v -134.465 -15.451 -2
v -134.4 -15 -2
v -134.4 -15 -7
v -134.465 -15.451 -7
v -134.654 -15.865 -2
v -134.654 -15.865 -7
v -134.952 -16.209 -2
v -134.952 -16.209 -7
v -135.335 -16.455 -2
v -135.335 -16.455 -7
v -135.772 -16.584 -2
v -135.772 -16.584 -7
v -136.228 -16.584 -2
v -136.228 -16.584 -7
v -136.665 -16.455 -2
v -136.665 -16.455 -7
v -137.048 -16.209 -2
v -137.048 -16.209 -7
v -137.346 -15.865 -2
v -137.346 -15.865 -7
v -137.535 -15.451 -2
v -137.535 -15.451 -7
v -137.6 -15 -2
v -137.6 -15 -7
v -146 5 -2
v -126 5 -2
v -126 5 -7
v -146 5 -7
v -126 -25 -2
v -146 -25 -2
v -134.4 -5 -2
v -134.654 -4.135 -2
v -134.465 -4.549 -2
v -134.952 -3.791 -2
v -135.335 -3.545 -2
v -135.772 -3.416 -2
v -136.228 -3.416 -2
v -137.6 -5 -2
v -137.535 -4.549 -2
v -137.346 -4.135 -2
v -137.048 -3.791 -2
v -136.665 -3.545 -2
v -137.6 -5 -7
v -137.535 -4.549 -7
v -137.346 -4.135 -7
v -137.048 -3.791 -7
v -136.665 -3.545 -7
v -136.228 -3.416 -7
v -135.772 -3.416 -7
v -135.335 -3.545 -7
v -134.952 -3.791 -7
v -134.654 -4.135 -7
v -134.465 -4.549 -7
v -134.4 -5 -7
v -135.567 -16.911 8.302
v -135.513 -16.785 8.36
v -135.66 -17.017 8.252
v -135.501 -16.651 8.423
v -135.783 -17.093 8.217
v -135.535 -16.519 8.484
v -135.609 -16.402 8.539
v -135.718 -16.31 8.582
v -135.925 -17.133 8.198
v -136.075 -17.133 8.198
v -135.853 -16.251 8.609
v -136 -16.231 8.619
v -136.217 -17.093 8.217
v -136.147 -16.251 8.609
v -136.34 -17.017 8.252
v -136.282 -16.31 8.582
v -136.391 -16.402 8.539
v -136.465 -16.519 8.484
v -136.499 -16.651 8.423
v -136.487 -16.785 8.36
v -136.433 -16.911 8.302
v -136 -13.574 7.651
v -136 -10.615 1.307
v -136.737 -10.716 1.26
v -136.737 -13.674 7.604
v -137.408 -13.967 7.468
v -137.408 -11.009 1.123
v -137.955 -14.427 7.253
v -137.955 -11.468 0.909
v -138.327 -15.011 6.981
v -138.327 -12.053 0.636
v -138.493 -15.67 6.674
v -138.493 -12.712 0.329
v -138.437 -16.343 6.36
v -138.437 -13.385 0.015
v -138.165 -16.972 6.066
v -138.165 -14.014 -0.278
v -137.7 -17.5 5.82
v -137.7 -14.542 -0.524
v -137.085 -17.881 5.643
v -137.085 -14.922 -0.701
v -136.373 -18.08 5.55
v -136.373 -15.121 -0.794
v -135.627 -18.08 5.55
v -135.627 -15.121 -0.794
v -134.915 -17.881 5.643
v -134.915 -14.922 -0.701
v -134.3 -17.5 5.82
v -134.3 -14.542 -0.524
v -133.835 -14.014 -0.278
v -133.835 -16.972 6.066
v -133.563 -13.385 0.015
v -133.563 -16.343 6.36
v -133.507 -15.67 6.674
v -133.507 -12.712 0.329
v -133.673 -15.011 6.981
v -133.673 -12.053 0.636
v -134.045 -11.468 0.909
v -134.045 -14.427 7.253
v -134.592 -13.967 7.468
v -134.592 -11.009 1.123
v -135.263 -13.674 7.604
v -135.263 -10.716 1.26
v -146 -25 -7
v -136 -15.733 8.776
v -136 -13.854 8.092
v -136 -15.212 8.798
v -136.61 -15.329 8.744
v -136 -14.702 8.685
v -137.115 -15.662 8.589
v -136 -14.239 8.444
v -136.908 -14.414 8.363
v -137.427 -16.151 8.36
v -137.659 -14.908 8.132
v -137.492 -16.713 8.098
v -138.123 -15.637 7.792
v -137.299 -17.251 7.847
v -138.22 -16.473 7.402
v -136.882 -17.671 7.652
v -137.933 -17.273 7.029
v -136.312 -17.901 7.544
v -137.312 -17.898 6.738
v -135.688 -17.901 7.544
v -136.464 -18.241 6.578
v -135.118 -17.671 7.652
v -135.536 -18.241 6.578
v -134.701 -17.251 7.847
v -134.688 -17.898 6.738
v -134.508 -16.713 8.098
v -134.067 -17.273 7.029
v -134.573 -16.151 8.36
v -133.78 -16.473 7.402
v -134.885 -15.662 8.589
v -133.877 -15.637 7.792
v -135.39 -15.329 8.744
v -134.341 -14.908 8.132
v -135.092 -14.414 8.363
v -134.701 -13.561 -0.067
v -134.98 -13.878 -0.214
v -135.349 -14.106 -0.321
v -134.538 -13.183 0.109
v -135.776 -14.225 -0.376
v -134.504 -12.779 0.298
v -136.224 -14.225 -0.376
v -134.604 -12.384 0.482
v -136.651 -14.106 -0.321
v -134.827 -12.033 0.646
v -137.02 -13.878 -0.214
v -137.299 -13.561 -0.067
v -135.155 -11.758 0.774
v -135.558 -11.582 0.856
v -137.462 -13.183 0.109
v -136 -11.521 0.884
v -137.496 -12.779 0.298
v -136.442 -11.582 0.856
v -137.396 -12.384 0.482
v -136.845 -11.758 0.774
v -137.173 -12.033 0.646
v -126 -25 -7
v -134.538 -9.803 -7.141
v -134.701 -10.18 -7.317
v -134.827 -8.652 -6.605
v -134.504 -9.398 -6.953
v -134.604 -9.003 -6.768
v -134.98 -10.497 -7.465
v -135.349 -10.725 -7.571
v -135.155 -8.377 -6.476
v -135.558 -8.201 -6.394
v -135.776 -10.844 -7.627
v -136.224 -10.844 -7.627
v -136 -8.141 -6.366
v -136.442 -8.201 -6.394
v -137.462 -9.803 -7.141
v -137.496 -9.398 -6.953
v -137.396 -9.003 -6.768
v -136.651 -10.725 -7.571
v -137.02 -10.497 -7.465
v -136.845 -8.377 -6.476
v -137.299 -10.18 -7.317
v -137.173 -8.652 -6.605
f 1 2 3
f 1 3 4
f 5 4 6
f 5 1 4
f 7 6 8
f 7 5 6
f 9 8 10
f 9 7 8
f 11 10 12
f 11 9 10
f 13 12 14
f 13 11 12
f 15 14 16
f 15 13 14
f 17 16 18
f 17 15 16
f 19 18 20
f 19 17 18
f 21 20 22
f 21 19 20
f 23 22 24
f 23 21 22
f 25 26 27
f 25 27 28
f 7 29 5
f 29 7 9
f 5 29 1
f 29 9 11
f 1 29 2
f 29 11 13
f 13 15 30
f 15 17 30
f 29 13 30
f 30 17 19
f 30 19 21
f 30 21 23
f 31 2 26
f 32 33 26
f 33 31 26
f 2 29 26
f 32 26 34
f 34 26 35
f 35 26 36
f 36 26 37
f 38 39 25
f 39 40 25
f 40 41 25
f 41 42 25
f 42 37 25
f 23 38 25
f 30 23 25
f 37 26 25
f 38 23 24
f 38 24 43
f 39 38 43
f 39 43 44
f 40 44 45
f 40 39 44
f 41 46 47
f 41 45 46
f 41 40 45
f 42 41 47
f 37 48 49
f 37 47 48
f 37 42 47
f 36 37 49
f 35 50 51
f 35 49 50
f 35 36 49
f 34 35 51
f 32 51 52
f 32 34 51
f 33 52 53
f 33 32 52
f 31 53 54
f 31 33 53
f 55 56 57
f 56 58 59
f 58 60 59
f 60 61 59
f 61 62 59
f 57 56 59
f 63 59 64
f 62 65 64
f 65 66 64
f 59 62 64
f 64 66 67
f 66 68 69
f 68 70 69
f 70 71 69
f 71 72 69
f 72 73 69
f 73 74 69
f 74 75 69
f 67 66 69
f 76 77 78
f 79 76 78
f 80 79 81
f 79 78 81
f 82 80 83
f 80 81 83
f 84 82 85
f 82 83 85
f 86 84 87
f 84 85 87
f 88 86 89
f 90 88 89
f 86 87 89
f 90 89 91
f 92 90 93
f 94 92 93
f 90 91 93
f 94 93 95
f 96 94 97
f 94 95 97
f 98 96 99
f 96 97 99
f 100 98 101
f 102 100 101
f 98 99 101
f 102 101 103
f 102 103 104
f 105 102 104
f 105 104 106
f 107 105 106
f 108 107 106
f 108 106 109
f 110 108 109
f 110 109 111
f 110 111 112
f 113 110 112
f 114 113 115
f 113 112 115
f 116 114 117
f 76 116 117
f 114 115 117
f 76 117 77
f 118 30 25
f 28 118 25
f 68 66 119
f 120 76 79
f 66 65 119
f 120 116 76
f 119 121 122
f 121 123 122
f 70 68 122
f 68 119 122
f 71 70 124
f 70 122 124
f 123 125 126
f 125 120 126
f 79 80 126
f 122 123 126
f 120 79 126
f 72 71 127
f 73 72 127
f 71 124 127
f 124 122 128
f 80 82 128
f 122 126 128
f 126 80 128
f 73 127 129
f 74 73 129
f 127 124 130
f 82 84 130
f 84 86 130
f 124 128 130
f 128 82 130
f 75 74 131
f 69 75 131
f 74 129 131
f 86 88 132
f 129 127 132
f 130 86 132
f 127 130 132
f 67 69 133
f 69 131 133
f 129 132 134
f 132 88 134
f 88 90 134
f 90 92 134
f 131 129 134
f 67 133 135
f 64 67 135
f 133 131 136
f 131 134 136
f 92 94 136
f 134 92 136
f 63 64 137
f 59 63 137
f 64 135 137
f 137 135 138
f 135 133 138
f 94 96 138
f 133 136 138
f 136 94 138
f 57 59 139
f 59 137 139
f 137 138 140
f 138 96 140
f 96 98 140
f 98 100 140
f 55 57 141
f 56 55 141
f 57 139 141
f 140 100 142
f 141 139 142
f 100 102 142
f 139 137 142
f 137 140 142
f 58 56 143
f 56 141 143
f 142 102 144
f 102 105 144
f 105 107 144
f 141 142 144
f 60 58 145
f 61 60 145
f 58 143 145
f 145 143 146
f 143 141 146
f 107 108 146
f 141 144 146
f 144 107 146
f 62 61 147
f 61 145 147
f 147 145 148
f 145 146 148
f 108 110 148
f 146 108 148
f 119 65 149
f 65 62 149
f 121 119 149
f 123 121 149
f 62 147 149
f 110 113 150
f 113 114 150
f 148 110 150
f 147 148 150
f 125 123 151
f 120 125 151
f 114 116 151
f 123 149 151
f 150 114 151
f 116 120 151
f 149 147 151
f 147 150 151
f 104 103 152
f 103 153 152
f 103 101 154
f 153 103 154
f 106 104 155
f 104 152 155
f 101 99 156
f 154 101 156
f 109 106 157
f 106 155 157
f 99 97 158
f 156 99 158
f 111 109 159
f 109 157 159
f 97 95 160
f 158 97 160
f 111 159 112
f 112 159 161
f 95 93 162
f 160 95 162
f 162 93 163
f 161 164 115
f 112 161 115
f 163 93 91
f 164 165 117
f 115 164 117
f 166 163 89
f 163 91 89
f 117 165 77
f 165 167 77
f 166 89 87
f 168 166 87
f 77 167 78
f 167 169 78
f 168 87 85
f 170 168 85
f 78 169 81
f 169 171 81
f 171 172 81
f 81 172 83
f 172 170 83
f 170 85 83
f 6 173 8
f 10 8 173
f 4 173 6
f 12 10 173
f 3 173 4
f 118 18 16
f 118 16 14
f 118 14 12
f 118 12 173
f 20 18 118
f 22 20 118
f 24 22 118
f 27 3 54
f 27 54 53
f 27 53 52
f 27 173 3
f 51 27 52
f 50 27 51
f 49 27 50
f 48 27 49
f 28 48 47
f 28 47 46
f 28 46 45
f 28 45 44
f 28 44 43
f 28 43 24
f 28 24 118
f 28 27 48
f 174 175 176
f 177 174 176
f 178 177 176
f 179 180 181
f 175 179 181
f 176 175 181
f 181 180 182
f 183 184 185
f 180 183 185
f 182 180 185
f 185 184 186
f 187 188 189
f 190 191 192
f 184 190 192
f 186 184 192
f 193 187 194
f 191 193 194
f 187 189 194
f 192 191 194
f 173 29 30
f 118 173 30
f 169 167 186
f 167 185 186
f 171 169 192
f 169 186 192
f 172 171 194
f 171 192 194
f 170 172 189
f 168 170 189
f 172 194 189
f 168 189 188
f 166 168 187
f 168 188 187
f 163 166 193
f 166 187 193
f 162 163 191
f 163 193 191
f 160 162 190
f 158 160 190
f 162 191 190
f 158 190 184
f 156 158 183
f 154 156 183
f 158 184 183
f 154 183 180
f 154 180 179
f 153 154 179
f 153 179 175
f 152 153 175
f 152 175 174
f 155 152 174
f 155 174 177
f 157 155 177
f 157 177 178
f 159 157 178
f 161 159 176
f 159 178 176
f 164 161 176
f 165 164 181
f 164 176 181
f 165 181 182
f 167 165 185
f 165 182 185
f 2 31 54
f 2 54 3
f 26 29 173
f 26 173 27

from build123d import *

# Parameters (mm, degrees)
SKETCH_1_W          = 20
SKETCH_1_H          = 30
EXTRUDE_1_DEPTH     = 5
CUT_EXTRUDE_1_REACH = 150.209
FILLET_1_R          = 2


with BuildPart() as part:
    # Эскиз1 → Бобышка-Вытянуть1 (new body)
    with BuildSketch(Plane(origin=(0, 0, -2), x_dir=(-1, 0, 0), z_dir=(0, 0, -1))):
        with Locations((136, -10)):
            Rectangle(SKETCH_1_W, SKETCH_1_H)
    extrude(amount=EXTRUDE_1_DEPTH)

    # Эскиз2 → Вырез-Вытянуть1 (cut, up to next)
    with BuildSketch(Plane.XY.offset(-2), mode=Mode.PRIVATE) as cut_extrude_1_sk1:
        with BuildLine():
            Line((-134.4, -5), (-134.4, -15))
            ThreePointArc((-134.4, -15), (-136, -16.6), (-137.6, -15))
            Line((-137.6, -15), (-137.6, -5))
            ThreePointArc((-137.6, -5), (-136, -3.4), (-134.4, -5))
        make_face()
    cut_extrude_1_tool1 = extrude(cut_extrude_1_sk1.sketch, amount=-CUT_EXTRUDE_1_REACH, mode=Mode.PRIVATE) & part.part
    add(cut_extrude_1_tool1.solids().sort_by_distance((-136, -10, -2))[0], mode=Mode.SUBTRACT)


with BuildPart() as body_2:
    # Эскиз4 → Повернуть1 (revolve)
    with BuildSketch(Plane(origin=(-136, 0, -136), x_dir=(0, 0, -1), z_dir=(1, 0, 0))):
        Polygon((-144.40723238, -16.68451045), (-145.463778034, -14.418740982), (-137.307007951, -10.615176626), (-136.884389689, -11.521484413), (-129.633927393, -8.140538319), (-129, -9.5), align=None)
    revolve(axis=Axis((-136, -9.5, -7), (0, -0.42261826174069383, 0.9063077870366526)))

    # Скругление1
    fillet_1_edges = [body_2.edges().sort_by_distance(p)[0] for p in [
        (-136, -18.950279917, 7.350686725),
    ]]
    fillet(fillet_1_edges, radius=FILLET_1_R)


solid = Compound([part.part, body_2.part])
